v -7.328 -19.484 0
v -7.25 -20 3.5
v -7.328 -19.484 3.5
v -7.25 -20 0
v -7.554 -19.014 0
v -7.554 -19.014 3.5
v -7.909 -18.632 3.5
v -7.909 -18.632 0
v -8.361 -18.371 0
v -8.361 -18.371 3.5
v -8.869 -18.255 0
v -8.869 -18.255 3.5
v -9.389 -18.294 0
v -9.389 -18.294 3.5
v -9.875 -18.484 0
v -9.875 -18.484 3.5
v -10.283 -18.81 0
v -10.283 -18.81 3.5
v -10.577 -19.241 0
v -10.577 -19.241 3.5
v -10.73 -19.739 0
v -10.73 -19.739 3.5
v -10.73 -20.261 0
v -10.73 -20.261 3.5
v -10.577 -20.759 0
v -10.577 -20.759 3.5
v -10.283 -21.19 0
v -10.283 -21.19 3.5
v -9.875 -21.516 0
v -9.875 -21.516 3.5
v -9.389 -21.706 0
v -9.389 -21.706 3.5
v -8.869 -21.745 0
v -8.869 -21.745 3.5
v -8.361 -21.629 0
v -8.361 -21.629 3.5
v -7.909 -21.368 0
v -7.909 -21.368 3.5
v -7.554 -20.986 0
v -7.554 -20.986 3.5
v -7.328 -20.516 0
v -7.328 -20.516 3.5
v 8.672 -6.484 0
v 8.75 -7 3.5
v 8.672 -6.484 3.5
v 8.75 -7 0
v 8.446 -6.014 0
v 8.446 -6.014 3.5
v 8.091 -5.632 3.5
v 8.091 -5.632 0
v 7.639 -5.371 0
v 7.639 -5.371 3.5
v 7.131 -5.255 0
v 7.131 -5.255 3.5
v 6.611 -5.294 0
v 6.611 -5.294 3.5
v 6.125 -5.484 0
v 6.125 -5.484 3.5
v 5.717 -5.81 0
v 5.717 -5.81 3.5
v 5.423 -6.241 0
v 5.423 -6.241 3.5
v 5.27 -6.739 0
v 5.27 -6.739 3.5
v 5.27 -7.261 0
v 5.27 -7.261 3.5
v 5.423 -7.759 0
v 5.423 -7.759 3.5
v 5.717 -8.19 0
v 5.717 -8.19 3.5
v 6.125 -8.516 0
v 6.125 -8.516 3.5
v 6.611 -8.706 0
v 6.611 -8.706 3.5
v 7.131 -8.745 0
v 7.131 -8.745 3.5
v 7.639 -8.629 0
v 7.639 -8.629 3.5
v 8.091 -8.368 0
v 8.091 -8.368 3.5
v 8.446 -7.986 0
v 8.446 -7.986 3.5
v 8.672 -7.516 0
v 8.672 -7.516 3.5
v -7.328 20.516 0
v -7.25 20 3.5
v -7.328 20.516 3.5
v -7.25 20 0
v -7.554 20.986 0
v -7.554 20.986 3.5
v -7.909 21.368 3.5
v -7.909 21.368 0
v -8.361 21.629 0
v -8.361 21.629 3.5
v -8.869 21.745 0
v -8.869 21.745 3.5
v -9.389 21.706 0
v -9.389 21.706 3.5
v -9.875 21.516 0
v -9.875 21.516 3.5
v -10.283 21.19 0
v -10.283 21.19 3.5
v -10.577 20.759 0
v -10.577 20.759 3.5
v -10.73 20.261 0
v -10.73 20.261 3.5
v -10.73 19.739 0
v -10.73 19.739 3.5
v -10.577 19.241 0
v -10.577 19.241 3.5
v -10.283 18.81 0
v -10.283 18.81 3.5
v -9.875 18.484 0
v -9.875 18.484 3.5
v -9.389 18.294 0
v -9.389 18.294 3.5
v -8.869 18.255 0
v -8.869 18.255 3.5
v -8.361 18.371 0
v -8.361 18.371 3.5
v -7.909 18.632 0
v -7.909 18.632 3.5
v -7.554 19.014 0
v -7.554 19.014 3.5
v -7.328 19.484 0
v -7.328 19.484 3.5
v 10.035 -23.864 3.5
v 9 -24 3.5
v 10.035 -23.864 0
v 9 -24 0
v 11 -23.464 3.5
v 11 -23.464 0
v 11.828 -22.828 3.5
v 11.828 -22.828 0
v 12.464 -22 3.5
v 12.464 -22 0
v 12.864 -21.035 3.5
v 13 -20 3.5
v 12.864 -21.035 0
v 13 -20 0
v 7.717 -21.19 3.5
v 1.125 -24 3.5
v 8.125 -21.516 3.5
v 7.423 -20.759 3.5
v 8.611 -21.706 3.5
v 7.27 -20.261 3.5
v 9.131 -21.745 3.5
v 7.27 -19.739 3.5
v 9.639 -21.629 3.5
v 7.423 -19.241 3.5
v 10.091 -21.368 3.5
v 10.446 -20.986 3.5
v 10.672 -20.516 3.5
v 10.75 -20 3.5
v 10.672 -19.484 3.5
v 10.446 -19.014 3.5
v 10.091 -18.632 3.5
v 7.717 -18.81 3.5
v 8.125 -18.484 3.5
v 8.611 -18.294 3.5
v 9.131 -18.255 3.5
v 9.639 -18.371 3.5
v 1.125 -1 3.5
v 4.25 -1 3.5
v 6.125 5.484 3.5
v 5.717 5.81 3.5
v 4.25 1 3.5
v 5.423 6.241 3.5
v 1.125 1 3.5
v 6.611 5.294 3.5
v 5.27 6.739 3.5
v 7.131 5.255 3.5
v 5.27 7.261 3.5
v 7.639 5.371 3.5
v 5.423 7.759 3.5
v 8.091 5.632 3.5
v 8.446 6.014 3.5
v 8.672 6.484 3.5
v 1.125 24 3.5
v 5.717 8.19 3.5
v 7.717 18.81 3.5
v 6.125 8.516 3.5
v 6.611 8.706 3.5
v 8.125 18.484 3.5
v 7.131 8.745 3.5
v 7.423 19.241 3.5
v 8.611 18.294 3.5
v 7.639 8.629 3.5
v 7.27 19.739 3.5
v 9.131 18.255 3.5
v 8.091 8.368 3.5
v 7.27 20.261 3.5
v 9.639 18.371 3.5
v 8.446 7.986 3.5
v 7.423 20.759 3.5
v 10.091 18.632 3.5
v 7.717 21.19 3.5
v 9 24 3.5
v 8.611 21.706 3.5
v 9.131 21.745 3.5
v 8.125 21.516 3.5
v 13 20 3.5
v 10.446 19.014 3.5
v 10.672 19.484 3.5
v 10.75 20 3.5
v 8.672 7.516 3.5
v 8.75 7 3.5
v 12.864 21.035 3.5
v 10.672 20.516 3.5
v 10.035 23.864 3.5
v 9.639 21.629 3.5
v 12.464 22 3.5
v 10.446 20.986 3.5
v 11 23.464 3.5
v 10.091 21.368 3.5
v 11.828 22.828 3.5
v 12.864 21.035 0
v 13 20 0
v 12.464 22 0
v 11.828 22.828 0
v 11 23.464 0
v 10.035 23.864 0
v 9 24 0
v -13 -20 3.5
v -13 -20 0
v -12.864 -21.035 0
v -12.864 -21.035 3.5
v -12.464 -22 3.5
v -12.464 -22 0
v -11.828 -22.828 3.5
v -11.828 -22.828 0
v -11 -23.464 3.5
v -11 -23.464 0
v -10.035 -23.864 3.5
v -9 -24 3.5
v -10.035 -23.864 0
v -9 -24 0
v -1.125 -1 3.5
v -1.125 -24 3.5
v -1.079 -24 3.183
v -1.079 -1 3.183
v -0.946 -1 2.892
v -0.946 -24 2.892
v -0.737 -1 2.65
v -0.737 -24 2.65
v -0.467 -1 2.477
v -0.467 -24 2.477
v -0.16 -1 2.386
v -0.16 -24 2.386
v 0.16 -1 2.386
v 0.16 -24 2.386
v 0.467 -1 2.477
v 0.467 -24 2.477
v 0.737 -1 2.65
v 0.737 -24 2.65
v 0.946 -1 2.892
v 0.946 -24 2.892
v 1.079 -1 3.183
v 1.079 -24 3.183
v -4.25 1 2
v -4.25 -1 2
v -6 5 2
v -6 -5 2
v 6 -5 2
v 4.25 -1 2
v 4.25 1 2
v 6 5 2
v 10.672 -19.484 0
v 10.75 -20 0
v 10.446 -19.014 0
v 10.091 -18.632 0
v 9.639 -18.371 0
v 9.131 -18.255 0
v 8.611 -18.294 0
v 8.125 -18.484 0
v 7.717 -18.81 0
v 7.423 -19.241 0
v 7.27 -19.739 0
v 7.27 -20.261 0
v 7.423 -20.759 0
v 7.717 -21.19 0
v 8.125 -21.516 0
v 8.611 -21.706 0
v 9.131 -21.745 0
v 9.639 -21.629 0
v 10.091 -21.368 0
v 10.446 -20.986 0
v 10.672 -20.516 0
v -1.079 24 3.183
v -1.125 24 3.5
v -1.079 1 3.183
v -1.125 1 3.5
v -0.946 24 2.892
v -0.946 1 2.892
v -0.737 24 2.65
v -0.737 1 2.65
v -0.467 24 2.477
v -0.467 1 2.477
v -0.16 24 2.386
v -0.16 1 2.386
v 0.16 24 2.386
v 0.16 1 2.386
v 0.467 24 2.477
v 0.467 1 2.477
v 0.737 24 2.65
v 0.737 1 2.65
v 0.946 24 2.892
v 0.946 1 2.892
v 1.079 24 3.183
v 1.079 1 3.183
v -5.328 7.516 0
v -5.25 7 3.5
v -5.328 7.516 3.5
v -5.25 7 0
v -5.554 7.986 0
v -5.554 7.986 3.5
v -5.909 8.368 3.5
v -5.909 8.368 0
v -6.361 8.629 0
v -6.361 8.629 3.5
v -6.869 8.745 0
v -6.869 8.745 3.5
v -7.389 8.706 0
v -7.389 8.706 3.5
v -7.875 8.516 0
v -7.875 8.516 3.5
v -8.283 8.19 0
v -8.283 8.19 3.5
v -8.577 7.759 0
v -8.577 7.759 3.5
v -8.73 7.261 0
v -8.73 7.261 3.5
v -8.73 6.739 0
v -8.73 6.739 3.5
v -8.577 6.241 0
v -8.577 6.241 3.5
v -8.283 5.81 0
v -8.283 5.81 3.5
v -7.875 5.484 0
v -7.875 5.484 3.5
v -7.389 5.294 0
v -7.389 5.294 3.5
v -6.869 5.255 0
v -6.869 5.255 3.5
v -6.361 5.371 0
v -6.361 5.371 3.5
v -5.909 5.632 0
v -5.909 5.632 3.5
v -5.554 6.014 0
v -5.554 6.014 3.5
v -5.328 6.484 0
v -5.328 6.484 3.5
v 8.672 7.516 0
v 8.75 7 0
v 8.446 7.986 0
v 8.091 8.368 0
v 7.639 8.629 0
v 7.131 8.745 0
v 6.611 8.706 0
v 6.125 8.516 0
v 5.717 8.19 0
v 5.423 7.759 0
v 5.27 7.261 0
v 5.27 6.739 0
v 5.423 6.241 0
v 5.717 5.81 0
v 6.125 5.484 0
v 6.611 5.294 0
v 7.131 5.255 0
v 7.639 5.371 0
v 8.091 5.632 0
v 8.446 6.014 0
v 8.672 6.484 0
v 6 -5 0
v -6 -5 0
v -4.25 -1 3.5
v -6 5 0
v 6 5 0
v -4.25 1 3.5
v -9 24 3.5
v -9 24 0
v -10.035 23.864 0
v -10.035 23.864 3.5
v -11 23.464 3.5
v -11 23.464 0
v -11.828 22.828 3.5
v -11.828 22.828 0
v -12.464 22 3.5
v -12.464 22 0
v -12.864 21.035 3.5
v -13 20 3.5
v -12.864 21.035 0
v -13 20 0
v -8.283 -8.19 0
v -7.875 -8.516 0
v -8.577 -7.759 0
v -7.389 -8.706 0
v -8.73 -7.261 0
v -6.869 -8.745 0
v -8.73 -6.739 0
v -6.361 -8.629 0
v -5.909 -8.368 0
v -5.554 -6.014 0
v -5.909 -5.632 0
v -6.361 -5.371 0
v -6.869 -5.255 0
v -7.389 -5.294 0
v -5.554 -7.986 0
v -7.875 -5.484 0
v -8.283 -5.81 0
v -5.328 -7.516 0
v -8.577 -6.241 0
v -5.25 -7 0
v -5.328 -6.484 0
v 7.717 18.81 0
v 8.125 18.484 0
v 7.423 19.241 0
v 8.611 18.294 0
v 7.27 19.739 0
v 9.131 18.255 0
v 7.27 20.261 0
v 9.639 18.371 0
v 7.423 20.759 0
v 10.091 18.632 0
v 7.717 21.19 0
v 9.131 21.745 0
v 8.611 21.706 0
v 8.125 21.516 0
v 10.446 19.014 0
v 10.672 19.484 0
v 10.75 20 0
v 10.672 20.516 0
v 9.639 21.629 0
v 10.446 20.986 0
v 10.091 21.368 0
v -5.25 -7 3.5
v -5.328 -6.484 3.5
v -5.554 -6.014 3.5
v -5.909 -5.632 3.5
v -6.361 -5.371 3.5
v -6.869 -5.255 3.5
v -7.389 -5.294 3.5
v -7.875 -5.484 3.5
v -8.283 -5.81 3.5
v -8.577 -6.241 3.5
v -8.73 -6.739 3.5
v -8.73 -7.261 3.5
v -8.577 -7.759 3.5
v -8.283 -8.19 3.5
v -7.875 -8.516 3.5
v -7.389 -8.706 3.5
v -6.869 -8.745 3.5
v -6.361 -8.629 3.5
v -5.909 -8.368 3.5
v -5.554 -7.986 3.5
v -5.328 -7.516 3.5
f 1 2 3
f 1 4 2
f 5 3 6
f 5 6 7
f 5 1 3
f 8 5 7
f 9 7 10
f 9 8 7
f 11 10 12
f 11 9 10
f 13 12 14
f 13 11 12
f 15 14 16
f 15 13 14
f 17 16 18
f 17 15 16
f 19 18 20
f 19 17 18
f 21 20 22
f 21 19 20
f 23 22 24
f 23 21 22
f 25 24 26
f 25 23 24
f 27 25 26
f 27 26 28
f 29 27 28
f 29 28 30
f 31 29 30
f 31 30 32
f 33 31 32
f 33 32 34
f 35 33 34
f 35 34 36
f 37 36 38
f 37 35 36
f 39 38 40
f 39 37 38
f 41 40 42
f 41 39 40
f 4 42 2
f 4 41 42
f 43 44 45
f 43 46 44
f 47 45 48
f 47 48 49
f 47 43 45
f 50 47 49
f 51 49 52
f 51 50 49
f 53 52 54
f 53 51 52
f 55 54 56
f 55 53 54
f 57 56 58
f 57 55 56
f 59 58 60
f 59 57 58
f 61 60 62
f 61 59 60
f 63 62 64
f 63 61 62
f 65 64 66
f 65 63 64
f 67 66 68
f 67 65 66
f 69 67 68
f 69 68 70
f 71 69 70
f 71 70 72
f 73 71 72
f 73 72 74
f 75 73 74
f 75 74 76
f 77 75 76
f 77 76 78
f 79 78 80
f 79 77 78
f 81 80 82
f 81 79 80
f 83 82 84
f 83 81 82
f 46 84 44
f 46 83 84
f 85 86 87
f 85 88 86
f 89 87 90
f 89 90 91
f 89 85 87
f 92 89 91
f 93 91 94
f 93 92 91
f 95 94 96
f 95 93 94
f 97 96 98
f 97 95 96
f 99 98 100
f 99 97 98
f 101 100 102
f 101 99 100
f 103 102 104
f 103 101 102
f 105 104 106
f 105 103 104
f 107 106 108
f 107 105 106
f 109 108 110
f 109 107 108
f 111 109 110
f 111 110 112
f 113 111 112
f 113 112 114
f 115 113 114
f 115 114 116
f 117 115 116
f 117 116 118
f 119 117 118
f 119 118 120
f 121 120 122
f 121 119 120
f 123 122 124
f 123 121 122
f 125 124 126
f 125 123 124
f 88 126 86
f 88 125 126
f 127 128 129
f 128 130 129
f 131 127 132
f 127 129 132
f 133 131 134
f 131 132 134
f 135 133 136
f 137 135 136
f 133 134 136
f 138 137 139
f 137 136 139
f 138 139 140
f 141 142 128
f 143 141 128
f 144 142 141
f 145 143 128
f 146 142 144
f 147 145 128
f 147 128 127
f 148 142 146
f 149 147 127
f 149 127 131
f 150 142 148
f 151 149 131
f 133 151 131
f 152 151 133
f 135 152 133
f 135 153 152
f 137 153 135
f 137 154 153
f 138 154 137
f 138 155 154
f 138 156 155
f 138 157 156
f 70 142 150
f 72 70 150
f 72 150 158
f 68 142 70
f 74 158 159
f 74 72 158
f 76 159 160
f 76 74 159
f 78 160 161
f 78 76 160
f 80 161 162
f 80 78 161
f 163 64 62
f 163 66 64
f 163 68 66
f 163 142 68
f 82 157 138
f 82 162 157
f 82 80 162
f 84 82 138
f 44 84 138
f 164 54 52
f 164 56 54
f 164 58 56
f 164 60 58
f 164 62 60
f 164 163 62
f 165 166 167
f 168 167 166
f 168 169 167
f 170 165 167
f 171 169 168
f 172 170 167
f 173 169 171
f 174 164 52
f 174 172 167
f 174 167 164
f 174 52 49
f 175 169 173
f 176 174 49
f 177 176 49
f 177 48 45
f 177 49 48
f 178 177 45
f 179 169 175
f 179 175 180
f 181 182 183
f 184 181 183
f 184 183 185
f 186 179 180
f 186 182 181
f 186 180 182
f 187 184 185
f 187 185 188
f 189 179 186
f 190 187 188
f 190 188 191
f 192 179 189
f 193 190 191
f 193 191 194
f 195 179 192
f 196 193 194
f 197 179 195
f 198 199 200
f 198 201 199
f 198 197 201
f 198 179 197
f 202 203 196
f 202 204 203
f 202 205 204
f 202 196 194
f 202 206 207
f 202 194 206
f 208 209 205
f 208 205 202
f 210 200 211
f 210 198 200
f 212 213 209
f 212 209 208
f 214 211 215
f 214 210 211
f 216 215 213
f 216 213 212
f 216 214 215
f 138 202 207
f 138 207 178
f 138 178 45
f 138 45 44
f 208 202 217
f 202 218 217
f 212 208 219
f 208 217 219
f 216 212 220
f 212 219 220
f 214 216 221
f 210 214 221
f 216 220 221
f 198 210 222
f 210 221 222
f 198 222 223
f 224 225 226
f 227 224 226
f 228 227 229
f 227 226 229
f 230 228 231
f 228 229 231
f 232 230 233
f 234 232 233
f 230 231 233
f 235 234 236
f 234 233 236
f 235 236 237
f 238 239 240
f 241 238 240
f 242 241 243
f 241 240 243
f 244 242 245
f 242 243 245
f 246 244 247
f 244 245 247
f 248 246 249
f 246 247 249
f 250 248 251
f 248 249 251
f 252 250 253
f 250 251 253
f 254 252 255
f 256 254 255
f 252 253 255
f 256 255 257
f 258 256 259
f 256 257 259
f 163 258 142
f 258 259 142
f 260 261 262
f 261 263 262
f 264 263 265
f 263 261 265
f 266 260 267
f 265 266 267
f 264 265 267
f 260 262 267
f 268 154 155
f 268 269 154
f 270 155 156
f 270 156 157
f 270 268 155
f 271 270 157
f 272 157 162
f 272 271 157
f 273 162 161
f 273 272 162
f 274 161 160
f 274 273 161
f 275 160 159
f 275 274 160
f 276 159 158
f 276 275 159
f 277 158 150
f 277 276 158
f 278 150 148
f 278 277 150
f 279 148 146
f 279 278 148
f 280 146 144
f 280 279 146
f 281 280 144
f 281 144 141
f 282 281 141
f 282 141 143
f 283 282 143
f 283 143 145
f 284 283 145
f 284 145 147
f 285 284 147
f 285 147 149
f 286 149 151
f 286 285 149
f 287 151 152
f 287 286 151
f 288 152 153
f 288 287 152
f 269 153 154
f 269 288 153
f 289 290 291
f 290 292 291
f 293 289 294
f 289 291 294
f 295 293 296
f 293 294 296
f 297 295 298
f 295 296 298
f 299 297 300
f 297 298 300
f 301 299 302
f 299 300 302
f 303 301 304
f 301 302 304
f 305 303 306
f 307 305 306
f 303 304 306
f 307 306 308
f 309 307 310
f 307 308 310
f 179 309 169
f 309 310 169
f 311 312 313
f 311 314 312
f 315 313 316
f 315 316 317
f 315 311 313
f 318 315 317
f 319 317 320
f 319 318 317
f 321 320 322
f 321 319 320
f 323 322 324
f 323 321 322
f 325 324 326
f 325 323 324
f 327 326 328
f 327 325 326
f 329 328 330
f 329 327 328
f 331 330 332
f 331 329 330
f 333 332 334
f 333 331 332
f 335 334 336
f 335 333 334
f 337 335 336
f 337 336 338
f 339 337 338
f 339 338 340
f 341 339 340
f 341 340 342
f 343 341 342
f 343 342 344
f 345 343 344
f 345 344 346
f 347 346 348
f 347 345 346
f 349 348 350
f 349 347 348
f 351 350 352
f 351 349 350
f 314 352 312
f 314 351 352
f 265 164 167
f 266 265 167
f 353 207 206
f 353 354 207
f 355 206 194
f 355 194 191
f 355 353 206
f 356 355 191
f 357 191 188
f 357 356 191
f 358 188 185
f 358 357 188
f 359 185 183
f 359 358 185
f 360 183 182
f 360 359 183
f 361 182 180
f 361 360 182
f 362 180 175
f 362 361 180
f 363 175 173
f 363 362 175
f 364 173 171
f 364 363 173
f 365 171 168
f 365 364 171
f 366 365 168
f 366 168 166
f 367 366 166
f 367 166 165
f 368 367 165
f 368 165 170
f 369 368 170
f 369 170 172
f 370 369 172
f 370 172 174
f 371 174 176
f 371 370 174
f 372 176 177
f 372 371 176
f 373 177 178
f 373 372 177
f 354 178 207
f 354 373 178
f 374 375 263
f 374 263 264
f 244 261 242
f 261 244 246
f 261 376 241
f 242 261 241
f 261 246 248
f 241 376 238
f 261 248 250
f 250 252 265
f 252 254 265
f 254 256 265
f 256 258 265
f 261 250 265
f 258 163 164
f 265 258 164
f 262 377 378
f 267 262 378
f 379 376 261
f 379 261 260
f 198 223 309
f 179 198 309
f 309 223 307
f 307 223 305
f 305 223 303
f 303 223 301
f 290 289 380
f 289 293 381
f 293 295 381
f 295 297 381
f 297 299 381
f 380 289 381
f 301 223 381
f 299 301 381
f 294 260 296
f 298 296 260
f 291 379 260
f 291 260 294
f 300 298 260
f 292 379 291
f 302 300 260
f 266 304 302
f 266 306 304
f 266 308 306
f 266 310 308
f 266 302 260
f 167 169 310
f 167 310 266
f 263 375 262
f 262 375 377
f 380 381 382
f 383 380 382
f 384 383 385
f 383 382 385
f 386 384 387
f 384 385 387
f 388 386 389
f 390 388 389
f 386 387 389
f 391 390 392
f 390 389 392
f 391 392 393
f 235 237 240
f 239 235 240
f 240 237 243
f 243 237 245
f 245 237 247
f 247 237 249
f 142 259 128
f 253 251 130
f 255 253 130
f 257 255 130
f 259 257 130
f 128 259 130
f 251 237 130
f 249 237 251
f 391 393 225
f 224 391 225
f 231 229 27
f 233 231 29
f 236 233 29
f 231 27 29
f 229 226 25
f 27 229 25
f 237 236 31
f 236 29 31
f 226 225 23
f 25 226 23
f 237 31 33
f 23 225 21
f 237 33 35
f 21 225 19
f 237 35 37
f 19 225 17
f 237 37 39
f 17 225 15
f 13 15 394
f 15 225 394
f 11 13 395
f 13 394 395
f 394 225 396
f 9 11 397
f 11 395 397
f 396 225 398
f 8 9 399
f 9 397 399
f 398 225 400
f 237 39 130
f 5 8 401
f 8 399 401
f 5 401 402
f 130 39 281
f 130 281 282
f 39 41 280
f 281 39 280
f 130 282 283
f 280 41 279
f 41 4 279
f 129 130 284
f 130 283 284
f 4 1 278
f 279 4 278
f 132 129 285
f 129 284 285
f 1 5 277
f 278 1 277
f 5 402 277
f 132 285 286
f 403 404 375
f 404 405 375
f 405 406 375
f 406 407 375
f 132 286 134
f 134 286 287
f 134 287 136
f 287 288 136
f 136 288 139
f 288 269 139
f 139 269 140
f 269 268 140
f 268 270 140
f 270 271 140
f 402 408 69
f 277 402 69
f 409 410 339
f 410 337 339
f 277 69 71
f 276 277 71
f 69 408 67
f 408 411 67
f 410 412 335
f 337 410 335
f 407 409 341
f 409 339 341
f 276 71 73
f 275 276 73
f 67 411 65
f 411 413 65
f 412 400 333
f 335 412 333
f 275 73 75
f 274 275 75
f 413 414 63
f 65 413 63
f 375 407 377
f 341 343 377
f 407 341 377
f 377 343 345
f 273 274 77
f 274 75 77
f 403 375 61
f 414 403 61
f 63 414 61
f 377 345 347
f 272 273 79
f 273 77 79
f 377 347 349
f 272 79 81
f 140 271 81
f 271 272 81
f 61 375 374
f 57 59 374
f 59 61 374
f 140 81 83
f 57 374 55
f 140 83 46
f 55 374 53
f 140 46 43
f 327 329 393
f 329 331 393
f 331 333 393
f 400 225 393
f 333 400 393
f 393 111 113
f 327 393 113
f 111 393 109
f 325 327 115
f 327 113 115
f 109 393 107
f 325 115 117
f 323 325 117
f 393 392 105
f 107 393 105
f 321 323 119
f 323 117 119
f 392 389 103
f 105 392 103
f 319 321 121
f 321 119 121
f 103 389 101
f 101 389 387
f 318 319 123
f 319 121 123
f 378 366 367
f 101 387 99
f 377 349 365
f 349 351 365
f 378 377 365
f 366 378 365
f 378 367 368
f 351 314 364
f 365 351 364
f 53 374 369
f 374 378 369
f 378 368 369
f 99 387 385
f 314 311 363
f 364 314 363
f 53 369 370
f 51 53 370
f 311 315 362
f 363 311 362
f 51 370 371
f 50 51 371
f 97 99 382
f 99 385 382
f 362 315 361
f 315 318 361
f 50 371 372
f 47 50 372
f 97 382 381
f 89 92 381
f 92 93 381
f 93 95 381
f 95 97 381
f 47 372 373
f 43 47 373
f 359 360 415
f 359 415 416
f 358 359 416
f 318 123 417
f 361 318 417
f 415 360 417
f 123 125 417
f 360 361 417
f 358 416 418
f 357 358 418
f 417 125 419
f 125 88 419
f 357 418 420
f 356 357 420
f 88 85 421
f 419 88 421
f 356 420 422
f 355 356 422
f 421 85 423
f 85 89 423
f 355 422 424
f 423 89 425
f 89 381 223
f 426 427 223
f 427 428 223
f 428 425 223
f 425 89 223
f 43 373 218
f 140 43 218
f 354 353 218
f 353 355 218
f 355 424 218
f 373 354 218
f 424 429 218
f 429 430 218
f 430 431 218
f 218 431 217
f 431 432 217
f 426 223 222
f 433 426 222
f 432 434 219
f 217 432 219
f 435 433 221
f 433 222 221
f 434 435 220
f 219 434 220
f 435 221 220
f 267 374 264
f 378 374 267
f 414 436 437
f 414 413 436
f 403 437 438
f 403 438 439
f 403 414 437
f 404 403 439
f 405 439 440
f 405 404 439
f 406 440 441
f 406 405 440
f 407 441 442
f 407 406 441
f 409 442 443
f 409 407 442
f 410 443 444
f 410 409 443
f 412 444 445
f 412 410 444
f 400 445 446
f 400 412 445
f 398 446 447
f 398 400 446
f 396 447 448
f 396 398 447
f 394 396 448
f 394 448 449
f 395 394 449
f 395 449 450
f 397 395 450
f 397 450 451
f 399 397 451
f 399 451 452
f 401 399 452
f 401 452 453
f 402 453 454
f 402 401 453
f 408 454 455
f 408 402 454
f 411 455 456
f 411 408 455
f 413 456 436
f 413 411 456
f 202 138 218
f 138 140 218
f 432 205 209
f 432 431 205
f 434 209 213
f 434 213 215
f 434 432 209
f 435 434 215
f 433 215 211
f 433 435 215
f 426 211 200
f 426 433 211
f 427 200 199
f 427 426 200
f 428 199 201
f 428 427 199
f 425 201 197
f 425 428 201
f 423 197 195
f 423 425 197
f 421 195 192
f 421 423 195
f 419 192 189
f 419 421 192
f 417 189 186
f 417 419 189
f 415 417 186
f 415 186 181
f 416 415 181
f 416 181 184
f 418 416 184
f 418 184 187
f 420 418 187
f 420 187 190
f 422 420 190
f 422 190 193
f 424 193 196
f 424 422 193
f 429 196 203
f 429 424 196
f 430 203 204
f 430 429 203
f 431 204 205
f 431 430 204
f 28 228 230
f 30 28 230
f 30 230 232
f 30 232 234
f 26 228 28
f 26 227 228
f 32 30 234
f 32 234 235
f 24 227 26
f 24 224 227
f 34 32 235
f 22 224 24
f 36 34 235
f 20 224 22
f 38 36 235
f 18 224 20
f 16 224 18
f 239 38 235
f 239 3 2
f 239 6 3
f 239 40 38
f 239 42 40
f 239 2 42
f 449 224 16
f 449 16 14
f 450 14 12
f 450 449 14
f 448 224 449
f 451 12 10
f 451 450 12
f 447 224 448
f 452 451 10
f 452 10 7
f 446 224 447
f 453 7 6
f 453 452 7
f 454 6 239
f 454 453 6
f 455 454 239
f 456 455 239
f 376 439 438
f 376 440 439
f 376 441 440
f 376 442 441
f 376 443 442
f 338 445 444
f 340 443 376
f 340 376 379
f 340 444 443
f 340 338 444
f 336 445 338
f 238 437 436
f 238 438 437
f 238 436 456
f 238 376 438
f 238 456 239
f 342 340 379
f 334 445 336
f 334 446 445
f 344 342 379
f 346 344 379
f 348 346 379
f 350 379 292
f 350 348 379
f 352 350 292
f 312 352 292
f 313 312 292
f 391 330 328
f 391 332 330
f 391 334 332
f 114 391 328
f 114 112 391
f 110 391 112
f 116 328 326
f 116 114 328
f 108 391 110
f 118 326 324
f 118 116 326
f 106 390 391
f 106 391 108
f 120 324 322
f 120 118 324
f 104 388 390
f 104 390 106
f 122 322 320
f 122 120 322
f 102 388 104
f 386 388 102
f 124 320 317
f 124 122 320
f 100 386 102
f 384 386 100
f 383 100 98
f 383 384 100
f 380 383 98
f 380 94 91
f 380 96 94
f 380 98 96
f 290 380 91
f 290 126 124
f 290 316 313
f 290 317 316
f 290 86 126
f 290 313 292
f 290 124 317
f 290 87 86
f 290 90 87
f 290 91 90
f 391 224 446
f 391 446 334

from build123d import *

# Parameters (mm, degrees)
F0_R     = 1.75
F0_W     = 12
F0_H     = 10
F1_DEPTH = 2
F2_R     = 1.75
F3_DEPTH = 1.5
F4_R     = 1.125
F5_DEPTH = 60
F6_W     = 8.5
F6_H     = 2
F7_DEPTH = 5


with BuildPart() as f1:
    # F0 (on Top) → F1 (new body)
    with BuildSketch(Plane.XY):
        with BuildLine():
            ThreePointArc((-13, -20), (-11.828427, -22.828427), (-9, -24))
            Line((-9, -24), (9, -24))
            ThreePointArc((9, -24), (11.828427, -22.828427), (13, -20))
            Line((13, -20), (13, 20))
            ThreePointArc((13, 20), (11.828427, 22.828427), (9, 24))
            Line((9, 24), (-9, 24))
            ThreePointArc((-9, 24), (-11.828427, 22.828427), (-13, 20))
            Line((-13, 20), (-13, -20))
        make_face()
        with Locations((-9, -20)):
            Circle(F0_R, mode=Mode.SUBTRACT)
        with Locations((-7, -7)):
            Circle(F0_R, mode=Mode.SUBTRACT)
        with Locations((9, -20)):
            Circle(F0_R, mode=Mode.SUBTRACT)
        with Locations((7, -7)):
            Circle(F0_R, mode=Mode.SUBTRACT)
        with Locations((-7, 7)):
            Circle(F0_R, mode=Mode.SUBTRACT)
        with Locations((-9, 20)):
            Circle(F0_R, mode=Mode.SUBTRACT)
        Rectangle(F0_W, F0_H, mode=Mode.SUBTRACT)
        with Locations((7, 7)):
            Circle(F0_R, mode=Mode.SUBTRACT)
        with Locations((9, 20)):
            Circle(F0_R, mode=Mode.SUBTRACT)
    extrude(amount=F1_DEPTH)

    # F2 (on face) → F3 (join)
    with BuildSketch(Plane.XY.offset(2)):
        with BuildLine():
            ThreePointArc((-13, -20), (-11.828427, -22.828427), (-9, -24))
            Line((-9, -24), (9, -24))
            ThreePointArc((9, -24), (11.828427, -22.828427), (13, -20))
            Line((13, -20), (13, 20))
            ThreePointArc((13, 20), (11.828427, 22.828427), (9, 24))
            Line((9, 24), (-9, 24))
            ThreePointArc((-9, 24), (-11.828427, 22.828427), (-13, 20))
            Line((-13, 20), (-13, -20))
        make_face()
        with Locations((-9, -20)):
            Circle(F2_R, mode=Mode.SUBTRACT)
        with Locations((-7, -7)):
            Circle(F2_R, mode=Mode.SUBTRACT)
        with Locations((9, -20)):
            Circle(F2_R, mode=Mode.SUBTRACT)
        with Locations((7, -7)):
            Circle(F2_R, mode=Mode.SUBTRACT)
        with Locations((-7, 7)):
            Circle(F2_R, mode=Mode.SUBTRACT)
        with Locations((-9, 20)):
            Circle(F2_R, mode=Mode.SUBTRACT)
        with Locations((7, 7)):
            Circle(F2_R, mode=Mode.SUBTRACT)
        with Locations((9, 20)):
            Circle(F2_R, mode=Mode.SUBTRACT)
    extrude(amount=F3_DEPTH)


with BuildPart() as f5:
    # F4 (on face) → F5 (new body)
    with BuildSketch(Plane.XZ.offset(24)):
        with Locations((0, 3.5)):
            Circle(F4_R)
    extrude(amount=-F5_DEPTH)


with BuildPart() as f7:
    # F6 (on face) → F7 (new body)
    with BuildSketch(Plane.XY.offset(3.5)):
        Rectangle(F6_W, F6_H)
    extrude(amount=-F7_DEPTH)


with BuildPart() as f1_1:
    add(f1.part)

    # F8: cut F5, F7
    add(f5.part, mode=Mode.SUBTRACT)
    add(f7.part, mode=Mode.SUBTRACT)


solid = f1_1.part
